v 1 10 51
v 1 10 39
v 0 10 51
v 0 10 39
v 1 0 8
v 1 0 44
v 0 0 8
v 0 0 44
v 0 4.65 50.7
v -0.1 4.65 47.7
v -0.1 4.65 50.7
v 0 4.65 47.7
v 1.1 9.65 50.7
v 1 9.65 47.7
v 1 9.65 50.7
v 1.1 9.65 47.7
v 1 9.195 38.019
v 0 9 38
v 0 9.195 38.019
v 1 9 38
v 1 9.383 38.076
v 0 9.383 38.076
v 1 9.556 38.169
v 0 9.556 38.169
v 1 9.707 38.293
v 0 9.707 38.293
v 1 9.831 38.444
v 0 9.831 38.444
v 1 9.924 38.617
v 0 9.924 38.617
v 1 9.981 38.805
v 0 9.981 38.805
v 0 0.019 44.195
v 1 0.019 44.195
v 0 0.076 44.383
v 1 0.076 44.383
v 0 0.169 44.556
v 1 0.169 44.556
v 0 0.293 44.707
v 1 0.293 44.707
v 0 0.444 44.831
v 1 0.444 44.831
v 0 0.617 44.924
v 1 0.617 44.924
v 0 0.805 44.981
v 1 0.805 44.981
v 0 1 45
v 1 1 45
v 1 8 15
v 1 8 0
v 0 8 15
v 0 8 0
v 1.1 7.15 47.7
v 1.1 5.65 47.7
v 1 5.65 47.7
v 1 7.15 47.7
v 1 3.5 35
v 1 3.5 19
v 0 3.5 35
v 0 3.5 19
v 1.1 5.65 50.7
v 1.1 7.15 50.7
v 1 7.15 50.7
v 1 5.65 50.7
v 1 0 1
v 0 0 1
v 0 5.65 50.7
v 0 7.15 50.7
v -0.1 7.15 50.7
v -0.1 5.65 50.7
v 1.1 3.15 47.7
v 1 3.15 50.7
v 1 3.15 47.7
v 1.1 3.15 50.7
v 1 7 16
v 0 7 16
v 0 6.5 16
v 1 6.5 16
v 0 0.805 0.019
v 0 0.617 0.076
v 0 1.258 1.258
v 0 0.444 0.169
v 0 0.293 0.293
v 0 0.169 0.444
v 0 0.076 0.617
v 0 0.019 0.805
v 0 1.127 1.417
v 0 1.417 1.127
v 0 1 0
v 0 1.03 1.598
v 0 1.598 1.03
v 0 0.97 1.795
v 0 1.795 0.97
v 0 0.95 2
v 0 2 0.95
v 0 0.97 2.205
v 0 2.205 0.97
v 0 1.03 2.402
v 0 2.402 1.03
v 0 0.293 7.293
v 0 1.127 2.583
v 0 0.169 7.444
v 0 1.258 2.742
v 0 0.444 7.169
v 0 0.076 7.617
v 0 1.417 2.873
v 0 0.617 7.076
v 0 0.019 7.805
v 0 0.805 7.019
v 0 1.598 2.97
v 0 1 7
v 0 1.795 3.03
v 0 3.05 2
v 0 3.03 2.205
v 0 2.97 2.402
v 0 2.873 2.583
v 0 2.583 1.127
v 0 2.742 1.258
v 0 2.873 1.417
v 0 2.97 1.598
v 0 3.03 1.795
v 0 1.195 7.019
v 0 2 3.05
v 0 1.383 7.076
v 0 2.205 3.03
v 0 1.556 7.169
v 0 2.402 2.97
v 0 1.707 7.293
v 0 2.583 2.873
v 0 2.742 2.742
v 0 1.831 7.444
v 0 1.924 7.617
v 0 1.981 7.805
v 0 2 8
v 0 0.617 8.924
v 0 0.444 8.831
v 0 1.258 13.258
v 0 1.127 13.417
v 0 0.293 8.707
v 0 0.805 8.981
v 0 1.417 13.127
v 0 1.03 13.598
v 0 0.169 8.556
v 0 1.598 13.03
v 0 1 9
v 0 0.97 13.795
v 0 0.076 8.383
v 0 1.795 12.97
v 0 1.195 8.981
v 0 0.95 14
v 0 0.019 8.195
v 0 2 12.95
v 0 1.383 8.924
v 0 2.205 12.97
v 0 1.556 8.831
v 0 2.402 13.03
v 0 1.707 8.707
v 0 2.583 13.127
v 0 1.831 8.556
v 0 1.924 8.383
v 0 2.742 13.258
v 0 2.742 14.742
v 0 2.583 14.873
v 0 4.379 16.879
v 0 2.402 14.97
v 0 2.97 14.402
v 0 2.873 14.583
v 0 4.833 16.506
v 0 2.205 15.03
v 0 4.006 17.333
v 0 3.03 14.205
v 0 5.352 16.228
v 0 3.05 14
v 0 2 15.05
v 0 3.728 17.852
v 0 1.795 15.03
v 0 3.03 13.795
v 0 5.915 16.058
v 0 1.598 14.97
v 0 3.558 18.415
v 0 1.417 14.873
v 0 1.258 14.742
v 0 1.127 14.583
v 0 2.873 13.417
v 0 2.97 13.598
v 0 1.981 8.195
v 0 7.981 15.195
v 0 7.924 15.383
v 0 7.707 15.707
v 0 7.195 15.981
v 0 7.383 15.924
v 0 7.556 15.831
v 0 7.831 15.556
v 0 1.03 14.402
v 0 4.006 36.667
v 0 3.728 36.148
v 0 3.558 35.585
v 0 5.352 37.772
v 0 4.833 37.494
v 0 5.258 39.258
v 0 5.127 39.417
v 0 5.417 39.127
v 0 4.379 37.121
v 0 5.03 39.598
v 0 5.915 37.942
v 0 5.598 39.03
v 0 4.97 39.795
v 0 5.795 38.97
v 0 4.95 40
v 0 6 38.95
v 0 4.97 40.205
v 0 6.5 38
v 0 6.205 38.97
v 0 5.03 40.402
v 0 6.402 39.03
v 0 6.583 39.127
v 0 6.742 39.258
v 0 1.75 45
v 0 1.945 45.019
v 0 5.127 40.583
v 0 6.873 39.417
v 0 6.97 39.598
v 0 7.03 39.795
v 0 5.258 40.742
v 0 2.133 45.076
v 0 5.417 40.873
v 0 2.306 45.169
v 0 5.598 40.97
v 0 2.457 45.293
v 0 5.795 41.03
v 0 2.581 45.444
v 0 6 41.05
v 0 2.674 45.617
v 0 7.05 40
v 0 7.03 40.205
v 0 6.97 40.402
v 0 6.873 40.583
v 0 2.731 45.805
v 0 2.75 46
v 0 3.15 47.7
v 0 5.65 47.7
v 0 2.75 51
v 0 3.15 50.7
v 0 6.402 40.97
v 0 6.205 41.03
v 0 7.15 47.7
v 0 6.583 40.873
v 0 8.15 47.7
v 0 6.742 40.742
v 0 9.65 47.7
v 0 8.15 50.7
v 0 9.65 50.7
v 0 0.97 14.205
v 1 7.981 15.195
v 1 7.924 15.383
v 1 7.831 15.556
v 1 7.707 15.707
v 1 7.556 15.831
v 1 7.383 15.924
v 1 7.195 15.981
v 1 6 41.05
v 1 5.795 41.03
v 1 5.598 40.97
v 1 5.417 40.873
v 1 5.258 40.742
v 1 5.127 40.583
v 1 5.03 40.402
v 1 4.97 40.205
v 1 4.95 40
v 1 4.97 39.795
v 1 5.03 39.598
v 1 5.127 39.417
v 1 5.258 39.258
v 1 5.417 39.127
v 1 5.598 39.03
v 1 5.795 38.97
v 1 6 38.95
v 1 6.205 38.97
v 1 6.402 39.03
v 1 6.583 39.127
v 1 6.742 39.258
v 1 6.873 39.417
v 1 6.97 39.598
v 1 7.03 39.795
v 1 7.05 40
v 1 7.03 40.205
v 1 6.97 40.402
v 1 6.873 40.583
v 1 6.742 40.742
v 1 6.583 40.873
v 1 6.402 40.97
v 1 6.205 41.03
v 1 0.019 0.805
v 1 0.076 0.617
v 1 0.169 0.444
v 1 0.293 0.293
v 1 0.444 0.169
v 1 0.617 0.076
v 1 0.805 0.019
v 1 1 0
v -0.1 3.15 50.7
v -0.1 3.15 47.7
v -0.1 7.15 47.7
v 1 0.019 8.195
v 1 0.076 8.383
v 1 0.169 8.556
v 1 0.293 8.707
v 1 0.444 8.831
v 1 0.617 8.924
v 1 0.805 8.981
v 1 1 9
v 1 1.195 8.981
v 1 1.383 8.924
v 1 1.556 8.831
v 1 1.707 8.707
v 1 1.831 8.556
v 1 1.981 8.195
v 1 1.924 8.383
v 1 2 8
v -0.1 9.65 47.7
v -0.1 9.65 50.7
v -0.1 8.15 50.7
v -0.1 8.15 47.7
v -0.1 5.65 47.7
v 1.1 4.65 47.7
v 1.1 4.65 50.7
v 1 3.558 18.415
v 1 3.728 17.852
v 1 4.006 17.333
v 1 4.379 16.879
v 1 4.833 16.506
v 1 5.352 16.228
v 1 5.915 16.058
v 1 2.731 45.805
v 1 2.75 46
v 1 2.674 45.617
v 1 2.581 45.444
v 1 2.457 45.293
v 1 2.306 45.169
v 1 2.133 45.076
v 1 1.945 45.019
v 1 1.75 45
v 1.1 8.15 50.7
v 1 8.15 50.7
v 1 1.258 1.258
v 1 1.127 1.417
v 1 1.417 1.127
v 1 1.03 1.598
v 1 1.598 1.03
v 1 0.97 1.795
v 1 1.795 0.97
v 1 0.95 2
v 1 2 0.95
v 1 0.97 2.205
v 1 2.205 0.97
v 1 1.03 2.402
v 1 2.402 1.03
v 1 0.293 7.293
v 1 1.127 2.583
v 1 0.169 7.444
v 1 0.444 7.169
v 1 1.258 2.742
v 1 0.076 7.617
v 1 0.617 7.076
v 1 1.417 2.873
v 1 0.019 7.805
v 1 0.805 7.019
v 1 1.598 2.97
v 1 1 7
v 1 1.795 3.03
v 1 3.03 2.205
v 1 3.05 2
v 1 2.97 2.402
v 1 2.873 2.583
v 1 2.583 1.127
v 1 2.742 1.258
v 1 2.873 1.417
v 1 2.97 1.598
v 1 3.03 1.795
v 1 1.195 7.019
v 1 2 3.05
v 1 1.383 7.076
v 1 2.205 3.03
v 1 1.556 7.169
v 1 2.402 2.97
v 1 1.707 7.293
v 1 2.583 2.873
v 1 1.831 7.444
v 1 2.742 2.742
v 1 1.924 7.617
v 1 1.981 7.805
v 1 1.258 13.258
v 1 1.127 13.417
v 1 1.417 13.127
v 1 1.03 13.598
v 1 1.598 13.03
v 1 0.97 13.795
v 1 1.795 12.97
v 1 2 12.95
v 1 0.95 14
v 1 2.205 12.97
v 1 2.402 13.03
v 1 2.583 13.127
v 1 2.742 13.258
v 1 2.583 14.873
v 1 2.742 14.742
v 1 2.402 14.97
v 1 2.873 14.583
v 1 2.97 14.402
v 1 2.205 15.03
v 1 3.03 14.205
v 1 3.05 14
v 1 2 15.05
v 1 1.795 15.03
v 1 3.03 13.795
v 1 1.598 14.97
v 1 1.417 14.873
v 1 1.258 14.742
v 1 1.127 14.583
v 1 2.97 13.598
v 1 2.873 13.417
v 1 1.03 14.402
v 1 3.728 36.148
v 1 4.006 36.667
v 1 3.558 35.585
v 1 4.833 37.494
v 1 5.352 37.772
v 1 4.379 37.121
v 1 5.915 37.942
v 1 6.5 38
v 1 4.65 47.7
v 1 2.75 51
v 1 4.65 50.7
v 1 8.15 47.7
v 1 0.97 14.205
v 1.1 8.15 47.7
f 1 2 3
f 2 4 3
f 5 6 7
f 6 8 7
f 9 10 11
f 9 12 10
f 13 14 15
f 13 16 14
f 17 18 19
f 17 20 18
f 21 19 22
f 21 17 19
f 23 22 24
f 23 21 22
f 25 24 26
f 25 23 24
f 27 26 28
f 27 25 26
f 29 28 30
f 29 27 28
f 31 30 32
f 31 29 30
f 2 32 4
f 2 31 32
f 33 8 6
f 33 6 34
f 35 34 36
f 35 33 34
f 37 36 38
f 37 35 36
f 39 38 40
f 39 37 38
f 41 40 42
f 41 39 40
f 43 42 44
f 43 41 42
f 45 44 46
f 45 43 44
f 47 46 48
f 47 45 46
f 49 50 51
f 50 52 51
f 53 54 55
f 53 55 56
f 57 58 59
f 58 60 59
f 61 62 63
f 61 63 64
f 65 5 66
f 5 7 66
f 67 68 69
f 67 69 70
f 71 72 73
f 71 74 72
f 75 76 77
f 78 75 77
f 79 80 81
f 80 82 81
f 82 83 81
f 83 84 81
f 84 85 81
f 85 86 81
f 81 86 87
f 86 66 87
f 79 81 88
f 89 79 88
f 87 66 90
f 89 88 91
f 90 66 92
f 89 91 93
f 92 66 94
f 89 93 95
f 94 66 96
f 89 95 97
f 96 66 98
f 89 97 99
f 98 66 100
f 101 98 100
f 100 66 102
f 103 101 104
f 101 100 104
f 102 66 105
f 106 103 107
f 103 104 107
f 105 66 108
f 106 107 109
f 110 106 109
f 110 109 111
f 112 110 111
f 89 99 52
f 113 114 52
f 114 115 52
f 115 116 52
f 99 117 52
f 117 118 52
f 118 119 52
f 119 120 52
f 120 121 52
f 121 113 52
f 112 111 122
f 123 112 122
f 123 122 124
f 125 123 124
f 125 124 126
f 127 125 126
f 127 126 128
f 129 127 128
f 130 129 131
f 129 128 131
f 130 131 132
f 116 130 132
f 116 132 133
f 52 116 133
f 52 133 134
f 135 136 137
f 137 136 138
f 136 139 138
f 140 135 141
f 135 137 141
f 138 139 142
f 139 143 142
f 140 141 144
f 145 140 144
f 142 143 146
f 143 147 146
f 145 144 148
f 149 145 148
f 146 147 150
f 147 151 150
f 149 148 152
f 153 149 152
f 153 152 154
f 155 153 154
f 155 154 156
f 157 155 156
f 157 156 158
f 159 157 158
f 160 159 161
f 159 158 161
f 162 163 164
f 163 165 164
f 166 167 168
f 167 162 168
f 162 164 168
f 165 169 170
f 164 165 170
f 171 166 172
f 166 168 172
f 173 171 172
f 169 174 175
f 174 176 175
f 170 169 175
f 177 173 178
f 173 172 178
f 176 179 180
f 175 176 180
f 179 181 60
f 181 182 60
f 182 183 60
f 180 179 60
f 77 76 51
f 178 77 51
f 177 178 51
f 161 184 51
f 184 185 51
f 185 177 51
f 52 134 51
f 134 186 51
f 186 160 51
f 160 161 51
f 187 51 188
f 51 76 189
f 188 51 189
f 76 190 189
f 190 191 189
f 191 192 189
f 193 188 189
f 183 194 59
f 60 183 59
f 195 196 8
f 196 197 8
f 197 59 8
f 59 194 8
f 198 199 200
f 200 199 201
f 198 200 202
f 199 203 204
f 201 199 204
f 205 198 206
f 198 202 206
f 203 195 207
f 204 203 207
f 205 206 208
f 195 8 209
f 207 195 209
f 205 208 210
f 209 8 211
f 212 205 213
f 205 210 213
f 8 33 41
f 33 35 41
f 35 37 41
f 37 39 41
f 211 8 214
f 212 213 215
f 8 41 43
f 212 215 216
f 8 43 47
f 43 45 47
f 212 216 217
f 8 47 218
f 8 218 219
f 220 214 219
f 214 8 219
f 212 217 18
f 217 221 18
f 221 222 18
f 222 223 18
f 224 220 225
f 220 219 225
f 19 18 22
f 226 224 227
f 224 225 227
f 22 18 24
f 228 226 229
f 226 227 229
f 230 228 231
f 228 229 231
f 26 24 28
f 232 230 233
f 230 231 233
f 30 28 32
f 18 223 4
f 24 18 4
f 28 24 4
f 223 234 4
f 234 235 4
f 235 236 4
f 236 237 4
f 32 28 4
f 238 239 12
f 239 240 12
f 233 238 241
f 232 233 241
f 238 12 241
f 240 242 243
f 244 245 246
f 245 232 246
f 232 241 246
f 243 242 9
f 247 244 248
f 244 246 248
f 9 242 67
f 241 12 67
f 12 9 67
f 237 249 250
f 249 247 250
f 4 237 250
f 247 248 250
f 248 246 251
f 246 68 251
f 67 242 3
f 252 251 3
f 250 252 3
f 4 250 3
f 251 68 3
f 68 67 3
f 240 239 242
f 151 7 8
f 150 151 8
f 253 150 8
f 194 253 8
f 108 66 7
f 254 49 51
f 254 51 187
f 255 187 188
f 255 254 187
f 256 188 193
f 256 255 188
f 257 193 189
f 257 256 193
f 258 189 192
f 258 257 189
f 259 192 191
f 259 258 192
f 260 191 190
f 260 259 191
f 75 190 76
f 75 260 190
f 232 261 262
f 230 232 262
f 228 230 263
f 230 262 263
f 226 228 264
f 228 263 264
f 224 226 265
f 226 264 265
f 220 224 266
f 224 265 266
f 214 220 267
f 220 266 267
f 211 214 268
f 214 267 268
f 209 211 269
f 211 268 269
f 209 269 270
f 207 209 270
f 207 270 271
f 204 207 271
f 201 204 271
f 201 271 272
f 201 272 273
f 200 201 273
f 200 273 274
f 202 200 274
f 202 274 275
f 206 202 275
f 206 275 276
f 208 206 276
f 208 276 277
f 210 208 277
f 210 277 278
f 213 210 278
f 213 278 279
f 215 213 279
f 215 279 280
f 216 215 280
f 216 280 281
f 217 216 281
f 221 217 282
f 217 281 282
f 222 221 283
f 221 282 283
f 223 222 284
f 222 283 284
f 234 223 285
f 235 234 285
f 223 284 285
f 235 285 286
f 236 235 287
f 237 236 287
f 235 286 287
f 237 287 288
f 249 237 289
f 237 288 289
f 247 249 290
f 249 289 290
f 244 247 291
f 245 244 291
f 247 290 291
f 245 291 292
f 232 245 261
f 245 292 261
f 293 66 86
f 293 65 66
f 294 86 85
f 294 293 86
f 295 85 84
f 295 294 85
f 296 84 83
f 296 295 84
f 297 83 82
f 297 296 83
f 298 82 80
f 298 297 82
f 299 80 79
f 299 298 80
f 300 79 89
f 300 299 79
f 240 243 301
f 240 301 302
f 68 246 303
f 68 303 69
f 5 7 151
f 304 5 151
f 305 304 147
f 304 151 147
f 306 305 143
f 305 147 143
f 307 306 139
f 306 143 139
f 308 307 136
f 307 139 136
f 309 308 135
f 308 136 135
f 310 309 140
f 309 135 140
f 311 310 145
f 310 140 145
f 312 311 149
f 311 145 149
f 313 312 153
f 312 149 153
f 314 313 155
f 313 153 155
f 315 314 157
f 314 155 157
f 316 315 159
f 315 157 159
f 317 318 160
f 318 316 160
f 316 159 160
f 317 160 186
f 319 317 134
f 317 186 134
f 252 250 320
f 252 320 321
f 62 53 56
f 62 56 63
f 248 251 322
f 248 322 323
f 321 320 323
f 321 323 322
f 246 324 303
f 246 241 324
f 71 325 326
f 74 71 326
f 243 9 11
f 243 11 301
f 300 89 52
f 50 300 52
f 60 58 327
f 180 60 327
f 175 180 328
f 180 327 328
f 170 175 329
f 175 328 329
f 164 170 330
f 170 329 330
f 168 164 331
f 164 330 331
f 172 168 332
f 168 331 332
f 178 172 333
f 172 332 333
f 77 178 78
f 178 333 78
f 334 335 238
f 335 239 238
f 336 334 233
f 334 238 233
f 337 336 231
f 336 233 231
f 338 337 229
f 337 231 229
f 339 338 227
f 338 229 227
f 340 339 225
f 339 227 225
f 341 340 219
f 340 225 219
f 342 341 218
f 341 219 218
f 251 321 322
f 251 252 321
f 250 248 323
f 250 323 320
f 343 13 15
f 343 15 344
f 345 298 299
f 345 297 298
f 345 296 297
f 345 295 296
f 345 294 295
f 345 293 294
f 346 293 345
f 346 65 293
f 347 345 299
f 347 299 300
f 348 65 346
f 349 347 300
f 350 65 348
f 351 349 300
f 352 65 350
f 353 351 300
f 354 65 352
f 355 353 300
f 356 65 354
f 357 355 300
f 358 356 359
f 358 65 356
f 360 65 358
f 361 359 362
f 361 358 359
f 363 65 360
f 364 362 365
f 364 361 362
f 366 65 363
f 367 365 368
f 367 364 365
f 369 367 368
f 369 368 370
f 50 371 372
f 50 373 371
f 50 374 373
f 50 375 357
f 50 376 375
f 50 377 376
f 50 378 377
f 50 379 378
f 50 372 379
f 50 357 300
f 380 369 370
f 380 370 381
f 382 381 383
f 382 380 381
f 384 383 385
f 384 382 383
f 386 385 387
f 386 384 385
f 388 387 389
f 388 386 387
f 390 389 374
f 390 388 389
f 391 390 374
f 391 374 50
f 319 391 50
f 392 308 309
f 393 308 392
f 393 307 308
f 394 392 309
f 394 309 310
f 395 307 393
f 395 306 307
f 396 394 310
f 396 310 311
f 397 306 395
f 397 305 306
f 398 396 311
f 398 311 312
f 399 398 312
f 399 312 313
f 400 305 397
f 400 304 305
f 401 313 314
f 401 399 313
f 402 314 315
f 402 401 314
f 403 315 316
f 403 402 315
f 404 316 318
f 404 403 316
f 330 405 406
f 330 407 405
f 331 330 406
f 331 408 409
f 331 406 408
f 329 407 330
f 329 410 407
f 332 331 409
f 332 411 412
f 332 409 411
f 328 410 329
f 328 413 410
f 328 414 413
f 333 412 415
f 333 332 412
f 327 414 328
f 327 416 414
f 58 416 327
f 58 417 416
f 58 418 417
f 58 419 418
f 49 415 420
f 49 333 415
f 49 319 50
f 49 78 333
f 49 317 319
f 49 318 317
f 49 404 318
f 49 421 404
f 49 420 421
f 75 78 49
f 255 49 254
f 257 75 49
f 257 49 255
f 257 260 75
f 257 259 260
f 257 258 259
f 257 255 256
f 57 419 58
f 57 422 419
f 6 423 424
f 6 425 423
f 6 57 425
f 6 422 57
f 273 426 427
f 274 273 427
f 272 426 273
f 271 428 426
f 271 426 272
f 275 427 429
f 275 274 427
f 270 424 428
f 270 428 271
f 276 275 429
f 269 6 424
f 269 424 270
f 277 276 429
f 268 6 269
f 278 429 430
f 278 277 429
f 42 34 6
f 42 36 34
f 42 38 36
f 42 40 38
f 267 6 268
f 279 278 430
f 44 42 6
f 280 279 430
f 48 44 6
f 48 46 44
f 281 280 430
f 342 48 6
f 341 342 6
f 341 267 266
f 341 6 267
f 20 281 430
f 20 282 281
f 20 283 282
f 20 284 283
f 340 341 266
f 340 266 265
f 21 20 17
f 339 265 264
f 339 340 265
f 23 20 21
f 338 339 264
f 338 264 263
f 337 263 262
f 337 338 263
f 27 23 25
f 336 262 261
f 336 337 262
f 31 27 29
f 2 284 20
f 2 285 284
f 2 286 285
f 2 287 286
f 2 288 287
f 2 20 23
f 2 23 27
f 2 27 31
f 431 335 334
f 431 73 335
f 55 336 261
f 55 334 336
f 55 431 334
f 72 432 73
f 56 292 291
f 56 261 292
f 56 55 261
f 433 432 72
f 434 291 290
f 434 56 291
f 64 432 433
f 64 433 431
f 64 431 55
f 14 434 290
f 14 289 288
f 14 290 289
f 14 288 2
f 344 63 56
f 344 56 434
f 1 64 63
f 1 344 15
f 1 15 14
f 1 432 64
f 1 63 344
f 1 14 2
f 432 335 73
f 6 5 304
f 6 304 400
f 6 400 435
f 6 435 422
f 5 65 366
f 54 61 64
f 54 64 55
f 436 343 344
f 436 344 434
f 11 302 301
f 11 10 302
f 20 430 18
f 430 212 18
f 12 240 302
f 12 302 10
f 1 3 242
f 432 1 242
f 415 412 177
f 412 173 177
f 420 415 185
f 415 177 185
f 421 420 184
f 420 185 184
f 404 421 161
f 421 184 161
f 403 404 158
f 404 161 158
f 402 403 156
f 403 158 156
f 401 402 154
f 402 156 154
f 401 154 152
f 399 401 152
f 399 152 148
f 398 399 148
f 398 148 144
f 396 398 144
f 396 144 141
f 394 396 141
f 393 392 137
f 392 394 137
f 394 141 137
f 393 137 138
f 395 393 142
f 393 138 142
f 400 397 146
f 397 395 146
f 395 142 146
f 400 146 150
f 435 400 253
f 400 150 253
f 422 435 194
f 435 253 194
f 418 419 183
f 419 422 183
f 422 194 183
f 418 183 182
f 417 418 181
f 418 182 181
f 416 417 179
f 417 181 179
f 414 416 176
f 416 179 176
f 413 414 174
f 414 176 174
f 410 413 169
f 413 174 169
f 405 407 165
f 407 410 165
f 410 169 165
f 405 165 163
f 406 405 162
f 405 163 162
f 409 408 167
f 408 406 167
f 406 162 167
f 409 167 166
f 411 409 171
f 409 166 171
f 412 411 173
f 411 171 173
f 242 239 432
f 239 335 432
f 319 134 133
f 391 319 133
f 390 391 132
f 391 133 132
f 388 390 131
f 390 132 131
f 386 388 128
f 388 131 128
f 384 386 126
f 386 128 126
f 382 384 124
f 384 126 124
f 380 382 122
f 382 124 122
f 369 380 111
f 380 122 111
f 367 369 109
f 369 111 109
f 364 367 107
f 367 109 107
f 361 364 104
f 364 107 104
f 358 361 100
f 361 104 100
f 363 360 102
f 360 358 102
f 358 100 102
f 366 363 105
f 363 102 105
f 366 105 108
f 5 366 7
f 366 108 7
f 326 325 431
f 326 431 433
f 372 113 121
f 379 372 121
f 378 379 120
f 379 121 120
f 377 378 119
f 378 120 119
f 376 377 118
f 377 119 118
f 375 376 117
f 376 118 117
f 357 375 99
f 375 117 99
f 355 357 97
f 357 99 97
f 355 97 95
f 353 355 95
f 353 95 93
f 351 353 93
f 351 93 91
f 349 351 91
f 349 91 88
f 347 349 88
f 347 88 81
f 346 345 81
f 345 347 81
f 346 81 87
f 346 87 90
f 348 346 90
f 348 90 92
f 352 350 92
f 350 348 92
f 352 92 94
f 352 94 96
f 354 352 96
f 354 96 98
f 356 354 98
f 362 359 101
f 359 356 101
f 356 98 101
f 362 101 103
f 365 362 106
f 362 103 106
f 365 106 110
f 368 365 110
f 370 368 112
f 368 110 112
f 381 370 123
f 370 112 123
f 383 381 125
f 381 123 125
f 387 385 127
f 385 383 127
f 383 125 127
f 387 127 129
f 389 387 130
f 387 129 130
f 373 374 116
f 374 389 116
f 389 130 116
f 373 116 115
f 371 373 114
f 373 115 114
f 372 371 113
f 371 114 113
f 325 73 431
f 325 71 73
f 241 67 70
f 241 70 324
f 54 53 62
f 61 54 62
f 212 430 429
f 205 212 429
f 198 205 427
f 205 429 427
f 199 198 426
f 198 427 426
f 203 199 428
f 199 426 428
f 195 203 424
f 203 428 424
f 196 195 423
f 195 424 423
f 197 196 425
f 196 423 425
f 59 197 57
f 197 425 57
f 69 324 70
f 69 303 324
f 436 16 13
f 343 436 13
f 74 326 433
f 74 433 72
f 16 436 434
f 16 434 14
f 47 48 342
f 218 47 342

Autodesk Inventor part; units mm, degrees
ref_plane "YZ Plane" through (0, 0, 0) normal (1, 0, 0) x (0, 1, 0)
ref_plane "XZ Plane" through (0, 0, 0) normal (0, 1, 0) x (-1, 0, 0)
ref_plane "XY Plane" through (0, 0, 0) normal (0, 0, 1) x (1, 0, 0)
sketch "Skizze1" plane through (0, 0, 0) normal (1, 0, 0) x (0, 1, 0)
  line L0 (0, 0) -> (8, 0)
  line L1 (8, 0) -> (8, 16)
  line L2 (8, 16) -> (3.5, 16)
  line L3 (0, 51) -> (0, 0)
  circle A0 centre (1, 8) radius 1
  circle A1 centre (2, 14) radius 1.05
  circle A2 centre (2, 2) radius 1.05
  line L4 (2, 14) -> (2, 2) construction
  line L5 (2, 8) -> (1, 8) construction
  line L6 (3.5, 16) -> (3.5, 38)
  line L7 (3.5, 38) -> (10, 38)
  line L8 (10, 38) -> (10, 51)
  line L9 (10, 51) -> (0, 51)
  dimension "d1" = 16
  dimension "d2" = 2
  dimension "d3" = 1
  dimension "d4" = 8
  dimension "d5" = 2.1
  dimension "d6" = 2.1
  dimension "d14" = 12
  dimension "d15" = 1
  dimension "d28" = 8
  dimension "d29" = 3.5
  dimension "d30" = 35
  dimension "d31" = 10
  dimension "d32" = 13
extrude "Extrusion1" add sketch "Skizze1" along normal blind 1
sketch "Skizze2" plane through (0, 0, 0) normal (-1, 0, 0) x (0, 0, 1)
  circle A0 centre (2, 2) radius 1.05 projected
  circle A1 centre (14, 2) radius 1.05 projected
  line L0 (0, 0) -> (0, 8) projected
  line L1 (8, 0) -> (0, 0) projected
  circle A2 centre (8, 1) radius 1 projected
  line L2 (51, 0) -> (8, 0) projected
  line L3 (16, 8) -> (16, 3.5) projected
  line L4 (0, 8) -> (16, 8) projected
  line L5 (50.7, 3.15) -> (47.7, 3.15)
  line L6 (47.7, 3.15) -> (47.7, 4.65)
  line L7 (47.7, 4.65) -> (50.7, 4.65)
  line L8 (50.7, 4.65) -> (50.7, 3.15)
  line L9 (50.7, 5.65) -> (47.7, 5.65)
  line L10 (47.7, 5.65) -> (47.7, 7.15)
  line L11 (47.7, 7.15) -> (50.7, 7.15)
  line L12 (50.7, 7.15) -> (50.7, 5.65)
  line L13 (50.7, 8.15) -> (47.7, 8.15)
  line L14 (47.7, 8.15) -> (47.7, 9.65)
  line L15 (47.7, 9.65) -> (50.7, 9.65)
  line L16 (50.7, 9.65) -> (50.7, 8.15)
  line L17 (51, 10) -> (51, 0) projected
  line L18 (38, 10) -> (51, 10) projected
  line L19 (38, 3.5) -> (38, 10) projected
  line L20 (16, 3.5) -> (38, 3.5) projected
  line L21 (50.7, 3.9) -> (47.7, 3.9) construction
  line L22 (47.7, 6.4) -> (50.7, 6.4) construction
  line L23 (50.7, 8.9) -> (47.7, 8.9) construction
  dimension "d16" = 1.5
  dimension "d17" = 1.5
  dimension "d21" = 3
  dimension "d26" = 1.5
  dimension "d34" = 2.5
  dimension "d35" = 2.5
  dimension "d36" = 0.3
  dimension "d37" = 6.4
extrude "Extrusion2" add sketch "Skizze2" along normal blind 0.1 and the other way blind 1.1 contours L5 L6 L7 L8 | L9 L10 L11 L12 | L13 L14 L15 L16
fillet "Rundung1" radius 3 2 edges at (0.5, 3.5, 16) (0.5, 3.5, 38)
sketch "Skizze3" plane through (0, 0, 51) normal (-1, 0, 0) x (0, 0, 1)
  circle A0 centre (-43, 1) radius 1 projected
  point P0 (-51, 0)
  point P1 (-11, 6)
  point P2 (-43, 0)
  dimension "d38" = 5
  dimension "d39" = 32
hole "Bohrung1" at (0, 6, 40) direction (1, 0, 0) diameter 2.1 end through all
fillet "Rundung2" radius 1 2 edges at (0.5, 10, 38) (0.5, 8, 16)
fillet "Rundung3" radius 1 1 edges at (0.5, 0, 0)
sketch "Skizze4" plane through (1, 1, 8) normal (1, 0, 0) x (0, 0, -1)
  line L0 (-43, -1) -> (0, -1) projected
  line L1 (-43, 9) -> (-43, -1) projected
  line L2 (-43, -1) -> (-37, -1)
  line L3 (-37, -1) -> (-37, 1.75)
  line L4 (-37, 1.75) -> (-43, 1.75)
  line L5 (-43, 1.75) -> (-43, -1)
  point P0 (8, -1)
  dimension "d52" = 2.75
  dimension "d53" = 6
extrude "Extrusion3" cut sketch "Skizze4" against normal through all
fillet "Rundung4" radius 1 2 edges at (0.5, 2.75, 45) (0.5, 0, 45)
properties part number "IR Platine" material "Phenolharz"
